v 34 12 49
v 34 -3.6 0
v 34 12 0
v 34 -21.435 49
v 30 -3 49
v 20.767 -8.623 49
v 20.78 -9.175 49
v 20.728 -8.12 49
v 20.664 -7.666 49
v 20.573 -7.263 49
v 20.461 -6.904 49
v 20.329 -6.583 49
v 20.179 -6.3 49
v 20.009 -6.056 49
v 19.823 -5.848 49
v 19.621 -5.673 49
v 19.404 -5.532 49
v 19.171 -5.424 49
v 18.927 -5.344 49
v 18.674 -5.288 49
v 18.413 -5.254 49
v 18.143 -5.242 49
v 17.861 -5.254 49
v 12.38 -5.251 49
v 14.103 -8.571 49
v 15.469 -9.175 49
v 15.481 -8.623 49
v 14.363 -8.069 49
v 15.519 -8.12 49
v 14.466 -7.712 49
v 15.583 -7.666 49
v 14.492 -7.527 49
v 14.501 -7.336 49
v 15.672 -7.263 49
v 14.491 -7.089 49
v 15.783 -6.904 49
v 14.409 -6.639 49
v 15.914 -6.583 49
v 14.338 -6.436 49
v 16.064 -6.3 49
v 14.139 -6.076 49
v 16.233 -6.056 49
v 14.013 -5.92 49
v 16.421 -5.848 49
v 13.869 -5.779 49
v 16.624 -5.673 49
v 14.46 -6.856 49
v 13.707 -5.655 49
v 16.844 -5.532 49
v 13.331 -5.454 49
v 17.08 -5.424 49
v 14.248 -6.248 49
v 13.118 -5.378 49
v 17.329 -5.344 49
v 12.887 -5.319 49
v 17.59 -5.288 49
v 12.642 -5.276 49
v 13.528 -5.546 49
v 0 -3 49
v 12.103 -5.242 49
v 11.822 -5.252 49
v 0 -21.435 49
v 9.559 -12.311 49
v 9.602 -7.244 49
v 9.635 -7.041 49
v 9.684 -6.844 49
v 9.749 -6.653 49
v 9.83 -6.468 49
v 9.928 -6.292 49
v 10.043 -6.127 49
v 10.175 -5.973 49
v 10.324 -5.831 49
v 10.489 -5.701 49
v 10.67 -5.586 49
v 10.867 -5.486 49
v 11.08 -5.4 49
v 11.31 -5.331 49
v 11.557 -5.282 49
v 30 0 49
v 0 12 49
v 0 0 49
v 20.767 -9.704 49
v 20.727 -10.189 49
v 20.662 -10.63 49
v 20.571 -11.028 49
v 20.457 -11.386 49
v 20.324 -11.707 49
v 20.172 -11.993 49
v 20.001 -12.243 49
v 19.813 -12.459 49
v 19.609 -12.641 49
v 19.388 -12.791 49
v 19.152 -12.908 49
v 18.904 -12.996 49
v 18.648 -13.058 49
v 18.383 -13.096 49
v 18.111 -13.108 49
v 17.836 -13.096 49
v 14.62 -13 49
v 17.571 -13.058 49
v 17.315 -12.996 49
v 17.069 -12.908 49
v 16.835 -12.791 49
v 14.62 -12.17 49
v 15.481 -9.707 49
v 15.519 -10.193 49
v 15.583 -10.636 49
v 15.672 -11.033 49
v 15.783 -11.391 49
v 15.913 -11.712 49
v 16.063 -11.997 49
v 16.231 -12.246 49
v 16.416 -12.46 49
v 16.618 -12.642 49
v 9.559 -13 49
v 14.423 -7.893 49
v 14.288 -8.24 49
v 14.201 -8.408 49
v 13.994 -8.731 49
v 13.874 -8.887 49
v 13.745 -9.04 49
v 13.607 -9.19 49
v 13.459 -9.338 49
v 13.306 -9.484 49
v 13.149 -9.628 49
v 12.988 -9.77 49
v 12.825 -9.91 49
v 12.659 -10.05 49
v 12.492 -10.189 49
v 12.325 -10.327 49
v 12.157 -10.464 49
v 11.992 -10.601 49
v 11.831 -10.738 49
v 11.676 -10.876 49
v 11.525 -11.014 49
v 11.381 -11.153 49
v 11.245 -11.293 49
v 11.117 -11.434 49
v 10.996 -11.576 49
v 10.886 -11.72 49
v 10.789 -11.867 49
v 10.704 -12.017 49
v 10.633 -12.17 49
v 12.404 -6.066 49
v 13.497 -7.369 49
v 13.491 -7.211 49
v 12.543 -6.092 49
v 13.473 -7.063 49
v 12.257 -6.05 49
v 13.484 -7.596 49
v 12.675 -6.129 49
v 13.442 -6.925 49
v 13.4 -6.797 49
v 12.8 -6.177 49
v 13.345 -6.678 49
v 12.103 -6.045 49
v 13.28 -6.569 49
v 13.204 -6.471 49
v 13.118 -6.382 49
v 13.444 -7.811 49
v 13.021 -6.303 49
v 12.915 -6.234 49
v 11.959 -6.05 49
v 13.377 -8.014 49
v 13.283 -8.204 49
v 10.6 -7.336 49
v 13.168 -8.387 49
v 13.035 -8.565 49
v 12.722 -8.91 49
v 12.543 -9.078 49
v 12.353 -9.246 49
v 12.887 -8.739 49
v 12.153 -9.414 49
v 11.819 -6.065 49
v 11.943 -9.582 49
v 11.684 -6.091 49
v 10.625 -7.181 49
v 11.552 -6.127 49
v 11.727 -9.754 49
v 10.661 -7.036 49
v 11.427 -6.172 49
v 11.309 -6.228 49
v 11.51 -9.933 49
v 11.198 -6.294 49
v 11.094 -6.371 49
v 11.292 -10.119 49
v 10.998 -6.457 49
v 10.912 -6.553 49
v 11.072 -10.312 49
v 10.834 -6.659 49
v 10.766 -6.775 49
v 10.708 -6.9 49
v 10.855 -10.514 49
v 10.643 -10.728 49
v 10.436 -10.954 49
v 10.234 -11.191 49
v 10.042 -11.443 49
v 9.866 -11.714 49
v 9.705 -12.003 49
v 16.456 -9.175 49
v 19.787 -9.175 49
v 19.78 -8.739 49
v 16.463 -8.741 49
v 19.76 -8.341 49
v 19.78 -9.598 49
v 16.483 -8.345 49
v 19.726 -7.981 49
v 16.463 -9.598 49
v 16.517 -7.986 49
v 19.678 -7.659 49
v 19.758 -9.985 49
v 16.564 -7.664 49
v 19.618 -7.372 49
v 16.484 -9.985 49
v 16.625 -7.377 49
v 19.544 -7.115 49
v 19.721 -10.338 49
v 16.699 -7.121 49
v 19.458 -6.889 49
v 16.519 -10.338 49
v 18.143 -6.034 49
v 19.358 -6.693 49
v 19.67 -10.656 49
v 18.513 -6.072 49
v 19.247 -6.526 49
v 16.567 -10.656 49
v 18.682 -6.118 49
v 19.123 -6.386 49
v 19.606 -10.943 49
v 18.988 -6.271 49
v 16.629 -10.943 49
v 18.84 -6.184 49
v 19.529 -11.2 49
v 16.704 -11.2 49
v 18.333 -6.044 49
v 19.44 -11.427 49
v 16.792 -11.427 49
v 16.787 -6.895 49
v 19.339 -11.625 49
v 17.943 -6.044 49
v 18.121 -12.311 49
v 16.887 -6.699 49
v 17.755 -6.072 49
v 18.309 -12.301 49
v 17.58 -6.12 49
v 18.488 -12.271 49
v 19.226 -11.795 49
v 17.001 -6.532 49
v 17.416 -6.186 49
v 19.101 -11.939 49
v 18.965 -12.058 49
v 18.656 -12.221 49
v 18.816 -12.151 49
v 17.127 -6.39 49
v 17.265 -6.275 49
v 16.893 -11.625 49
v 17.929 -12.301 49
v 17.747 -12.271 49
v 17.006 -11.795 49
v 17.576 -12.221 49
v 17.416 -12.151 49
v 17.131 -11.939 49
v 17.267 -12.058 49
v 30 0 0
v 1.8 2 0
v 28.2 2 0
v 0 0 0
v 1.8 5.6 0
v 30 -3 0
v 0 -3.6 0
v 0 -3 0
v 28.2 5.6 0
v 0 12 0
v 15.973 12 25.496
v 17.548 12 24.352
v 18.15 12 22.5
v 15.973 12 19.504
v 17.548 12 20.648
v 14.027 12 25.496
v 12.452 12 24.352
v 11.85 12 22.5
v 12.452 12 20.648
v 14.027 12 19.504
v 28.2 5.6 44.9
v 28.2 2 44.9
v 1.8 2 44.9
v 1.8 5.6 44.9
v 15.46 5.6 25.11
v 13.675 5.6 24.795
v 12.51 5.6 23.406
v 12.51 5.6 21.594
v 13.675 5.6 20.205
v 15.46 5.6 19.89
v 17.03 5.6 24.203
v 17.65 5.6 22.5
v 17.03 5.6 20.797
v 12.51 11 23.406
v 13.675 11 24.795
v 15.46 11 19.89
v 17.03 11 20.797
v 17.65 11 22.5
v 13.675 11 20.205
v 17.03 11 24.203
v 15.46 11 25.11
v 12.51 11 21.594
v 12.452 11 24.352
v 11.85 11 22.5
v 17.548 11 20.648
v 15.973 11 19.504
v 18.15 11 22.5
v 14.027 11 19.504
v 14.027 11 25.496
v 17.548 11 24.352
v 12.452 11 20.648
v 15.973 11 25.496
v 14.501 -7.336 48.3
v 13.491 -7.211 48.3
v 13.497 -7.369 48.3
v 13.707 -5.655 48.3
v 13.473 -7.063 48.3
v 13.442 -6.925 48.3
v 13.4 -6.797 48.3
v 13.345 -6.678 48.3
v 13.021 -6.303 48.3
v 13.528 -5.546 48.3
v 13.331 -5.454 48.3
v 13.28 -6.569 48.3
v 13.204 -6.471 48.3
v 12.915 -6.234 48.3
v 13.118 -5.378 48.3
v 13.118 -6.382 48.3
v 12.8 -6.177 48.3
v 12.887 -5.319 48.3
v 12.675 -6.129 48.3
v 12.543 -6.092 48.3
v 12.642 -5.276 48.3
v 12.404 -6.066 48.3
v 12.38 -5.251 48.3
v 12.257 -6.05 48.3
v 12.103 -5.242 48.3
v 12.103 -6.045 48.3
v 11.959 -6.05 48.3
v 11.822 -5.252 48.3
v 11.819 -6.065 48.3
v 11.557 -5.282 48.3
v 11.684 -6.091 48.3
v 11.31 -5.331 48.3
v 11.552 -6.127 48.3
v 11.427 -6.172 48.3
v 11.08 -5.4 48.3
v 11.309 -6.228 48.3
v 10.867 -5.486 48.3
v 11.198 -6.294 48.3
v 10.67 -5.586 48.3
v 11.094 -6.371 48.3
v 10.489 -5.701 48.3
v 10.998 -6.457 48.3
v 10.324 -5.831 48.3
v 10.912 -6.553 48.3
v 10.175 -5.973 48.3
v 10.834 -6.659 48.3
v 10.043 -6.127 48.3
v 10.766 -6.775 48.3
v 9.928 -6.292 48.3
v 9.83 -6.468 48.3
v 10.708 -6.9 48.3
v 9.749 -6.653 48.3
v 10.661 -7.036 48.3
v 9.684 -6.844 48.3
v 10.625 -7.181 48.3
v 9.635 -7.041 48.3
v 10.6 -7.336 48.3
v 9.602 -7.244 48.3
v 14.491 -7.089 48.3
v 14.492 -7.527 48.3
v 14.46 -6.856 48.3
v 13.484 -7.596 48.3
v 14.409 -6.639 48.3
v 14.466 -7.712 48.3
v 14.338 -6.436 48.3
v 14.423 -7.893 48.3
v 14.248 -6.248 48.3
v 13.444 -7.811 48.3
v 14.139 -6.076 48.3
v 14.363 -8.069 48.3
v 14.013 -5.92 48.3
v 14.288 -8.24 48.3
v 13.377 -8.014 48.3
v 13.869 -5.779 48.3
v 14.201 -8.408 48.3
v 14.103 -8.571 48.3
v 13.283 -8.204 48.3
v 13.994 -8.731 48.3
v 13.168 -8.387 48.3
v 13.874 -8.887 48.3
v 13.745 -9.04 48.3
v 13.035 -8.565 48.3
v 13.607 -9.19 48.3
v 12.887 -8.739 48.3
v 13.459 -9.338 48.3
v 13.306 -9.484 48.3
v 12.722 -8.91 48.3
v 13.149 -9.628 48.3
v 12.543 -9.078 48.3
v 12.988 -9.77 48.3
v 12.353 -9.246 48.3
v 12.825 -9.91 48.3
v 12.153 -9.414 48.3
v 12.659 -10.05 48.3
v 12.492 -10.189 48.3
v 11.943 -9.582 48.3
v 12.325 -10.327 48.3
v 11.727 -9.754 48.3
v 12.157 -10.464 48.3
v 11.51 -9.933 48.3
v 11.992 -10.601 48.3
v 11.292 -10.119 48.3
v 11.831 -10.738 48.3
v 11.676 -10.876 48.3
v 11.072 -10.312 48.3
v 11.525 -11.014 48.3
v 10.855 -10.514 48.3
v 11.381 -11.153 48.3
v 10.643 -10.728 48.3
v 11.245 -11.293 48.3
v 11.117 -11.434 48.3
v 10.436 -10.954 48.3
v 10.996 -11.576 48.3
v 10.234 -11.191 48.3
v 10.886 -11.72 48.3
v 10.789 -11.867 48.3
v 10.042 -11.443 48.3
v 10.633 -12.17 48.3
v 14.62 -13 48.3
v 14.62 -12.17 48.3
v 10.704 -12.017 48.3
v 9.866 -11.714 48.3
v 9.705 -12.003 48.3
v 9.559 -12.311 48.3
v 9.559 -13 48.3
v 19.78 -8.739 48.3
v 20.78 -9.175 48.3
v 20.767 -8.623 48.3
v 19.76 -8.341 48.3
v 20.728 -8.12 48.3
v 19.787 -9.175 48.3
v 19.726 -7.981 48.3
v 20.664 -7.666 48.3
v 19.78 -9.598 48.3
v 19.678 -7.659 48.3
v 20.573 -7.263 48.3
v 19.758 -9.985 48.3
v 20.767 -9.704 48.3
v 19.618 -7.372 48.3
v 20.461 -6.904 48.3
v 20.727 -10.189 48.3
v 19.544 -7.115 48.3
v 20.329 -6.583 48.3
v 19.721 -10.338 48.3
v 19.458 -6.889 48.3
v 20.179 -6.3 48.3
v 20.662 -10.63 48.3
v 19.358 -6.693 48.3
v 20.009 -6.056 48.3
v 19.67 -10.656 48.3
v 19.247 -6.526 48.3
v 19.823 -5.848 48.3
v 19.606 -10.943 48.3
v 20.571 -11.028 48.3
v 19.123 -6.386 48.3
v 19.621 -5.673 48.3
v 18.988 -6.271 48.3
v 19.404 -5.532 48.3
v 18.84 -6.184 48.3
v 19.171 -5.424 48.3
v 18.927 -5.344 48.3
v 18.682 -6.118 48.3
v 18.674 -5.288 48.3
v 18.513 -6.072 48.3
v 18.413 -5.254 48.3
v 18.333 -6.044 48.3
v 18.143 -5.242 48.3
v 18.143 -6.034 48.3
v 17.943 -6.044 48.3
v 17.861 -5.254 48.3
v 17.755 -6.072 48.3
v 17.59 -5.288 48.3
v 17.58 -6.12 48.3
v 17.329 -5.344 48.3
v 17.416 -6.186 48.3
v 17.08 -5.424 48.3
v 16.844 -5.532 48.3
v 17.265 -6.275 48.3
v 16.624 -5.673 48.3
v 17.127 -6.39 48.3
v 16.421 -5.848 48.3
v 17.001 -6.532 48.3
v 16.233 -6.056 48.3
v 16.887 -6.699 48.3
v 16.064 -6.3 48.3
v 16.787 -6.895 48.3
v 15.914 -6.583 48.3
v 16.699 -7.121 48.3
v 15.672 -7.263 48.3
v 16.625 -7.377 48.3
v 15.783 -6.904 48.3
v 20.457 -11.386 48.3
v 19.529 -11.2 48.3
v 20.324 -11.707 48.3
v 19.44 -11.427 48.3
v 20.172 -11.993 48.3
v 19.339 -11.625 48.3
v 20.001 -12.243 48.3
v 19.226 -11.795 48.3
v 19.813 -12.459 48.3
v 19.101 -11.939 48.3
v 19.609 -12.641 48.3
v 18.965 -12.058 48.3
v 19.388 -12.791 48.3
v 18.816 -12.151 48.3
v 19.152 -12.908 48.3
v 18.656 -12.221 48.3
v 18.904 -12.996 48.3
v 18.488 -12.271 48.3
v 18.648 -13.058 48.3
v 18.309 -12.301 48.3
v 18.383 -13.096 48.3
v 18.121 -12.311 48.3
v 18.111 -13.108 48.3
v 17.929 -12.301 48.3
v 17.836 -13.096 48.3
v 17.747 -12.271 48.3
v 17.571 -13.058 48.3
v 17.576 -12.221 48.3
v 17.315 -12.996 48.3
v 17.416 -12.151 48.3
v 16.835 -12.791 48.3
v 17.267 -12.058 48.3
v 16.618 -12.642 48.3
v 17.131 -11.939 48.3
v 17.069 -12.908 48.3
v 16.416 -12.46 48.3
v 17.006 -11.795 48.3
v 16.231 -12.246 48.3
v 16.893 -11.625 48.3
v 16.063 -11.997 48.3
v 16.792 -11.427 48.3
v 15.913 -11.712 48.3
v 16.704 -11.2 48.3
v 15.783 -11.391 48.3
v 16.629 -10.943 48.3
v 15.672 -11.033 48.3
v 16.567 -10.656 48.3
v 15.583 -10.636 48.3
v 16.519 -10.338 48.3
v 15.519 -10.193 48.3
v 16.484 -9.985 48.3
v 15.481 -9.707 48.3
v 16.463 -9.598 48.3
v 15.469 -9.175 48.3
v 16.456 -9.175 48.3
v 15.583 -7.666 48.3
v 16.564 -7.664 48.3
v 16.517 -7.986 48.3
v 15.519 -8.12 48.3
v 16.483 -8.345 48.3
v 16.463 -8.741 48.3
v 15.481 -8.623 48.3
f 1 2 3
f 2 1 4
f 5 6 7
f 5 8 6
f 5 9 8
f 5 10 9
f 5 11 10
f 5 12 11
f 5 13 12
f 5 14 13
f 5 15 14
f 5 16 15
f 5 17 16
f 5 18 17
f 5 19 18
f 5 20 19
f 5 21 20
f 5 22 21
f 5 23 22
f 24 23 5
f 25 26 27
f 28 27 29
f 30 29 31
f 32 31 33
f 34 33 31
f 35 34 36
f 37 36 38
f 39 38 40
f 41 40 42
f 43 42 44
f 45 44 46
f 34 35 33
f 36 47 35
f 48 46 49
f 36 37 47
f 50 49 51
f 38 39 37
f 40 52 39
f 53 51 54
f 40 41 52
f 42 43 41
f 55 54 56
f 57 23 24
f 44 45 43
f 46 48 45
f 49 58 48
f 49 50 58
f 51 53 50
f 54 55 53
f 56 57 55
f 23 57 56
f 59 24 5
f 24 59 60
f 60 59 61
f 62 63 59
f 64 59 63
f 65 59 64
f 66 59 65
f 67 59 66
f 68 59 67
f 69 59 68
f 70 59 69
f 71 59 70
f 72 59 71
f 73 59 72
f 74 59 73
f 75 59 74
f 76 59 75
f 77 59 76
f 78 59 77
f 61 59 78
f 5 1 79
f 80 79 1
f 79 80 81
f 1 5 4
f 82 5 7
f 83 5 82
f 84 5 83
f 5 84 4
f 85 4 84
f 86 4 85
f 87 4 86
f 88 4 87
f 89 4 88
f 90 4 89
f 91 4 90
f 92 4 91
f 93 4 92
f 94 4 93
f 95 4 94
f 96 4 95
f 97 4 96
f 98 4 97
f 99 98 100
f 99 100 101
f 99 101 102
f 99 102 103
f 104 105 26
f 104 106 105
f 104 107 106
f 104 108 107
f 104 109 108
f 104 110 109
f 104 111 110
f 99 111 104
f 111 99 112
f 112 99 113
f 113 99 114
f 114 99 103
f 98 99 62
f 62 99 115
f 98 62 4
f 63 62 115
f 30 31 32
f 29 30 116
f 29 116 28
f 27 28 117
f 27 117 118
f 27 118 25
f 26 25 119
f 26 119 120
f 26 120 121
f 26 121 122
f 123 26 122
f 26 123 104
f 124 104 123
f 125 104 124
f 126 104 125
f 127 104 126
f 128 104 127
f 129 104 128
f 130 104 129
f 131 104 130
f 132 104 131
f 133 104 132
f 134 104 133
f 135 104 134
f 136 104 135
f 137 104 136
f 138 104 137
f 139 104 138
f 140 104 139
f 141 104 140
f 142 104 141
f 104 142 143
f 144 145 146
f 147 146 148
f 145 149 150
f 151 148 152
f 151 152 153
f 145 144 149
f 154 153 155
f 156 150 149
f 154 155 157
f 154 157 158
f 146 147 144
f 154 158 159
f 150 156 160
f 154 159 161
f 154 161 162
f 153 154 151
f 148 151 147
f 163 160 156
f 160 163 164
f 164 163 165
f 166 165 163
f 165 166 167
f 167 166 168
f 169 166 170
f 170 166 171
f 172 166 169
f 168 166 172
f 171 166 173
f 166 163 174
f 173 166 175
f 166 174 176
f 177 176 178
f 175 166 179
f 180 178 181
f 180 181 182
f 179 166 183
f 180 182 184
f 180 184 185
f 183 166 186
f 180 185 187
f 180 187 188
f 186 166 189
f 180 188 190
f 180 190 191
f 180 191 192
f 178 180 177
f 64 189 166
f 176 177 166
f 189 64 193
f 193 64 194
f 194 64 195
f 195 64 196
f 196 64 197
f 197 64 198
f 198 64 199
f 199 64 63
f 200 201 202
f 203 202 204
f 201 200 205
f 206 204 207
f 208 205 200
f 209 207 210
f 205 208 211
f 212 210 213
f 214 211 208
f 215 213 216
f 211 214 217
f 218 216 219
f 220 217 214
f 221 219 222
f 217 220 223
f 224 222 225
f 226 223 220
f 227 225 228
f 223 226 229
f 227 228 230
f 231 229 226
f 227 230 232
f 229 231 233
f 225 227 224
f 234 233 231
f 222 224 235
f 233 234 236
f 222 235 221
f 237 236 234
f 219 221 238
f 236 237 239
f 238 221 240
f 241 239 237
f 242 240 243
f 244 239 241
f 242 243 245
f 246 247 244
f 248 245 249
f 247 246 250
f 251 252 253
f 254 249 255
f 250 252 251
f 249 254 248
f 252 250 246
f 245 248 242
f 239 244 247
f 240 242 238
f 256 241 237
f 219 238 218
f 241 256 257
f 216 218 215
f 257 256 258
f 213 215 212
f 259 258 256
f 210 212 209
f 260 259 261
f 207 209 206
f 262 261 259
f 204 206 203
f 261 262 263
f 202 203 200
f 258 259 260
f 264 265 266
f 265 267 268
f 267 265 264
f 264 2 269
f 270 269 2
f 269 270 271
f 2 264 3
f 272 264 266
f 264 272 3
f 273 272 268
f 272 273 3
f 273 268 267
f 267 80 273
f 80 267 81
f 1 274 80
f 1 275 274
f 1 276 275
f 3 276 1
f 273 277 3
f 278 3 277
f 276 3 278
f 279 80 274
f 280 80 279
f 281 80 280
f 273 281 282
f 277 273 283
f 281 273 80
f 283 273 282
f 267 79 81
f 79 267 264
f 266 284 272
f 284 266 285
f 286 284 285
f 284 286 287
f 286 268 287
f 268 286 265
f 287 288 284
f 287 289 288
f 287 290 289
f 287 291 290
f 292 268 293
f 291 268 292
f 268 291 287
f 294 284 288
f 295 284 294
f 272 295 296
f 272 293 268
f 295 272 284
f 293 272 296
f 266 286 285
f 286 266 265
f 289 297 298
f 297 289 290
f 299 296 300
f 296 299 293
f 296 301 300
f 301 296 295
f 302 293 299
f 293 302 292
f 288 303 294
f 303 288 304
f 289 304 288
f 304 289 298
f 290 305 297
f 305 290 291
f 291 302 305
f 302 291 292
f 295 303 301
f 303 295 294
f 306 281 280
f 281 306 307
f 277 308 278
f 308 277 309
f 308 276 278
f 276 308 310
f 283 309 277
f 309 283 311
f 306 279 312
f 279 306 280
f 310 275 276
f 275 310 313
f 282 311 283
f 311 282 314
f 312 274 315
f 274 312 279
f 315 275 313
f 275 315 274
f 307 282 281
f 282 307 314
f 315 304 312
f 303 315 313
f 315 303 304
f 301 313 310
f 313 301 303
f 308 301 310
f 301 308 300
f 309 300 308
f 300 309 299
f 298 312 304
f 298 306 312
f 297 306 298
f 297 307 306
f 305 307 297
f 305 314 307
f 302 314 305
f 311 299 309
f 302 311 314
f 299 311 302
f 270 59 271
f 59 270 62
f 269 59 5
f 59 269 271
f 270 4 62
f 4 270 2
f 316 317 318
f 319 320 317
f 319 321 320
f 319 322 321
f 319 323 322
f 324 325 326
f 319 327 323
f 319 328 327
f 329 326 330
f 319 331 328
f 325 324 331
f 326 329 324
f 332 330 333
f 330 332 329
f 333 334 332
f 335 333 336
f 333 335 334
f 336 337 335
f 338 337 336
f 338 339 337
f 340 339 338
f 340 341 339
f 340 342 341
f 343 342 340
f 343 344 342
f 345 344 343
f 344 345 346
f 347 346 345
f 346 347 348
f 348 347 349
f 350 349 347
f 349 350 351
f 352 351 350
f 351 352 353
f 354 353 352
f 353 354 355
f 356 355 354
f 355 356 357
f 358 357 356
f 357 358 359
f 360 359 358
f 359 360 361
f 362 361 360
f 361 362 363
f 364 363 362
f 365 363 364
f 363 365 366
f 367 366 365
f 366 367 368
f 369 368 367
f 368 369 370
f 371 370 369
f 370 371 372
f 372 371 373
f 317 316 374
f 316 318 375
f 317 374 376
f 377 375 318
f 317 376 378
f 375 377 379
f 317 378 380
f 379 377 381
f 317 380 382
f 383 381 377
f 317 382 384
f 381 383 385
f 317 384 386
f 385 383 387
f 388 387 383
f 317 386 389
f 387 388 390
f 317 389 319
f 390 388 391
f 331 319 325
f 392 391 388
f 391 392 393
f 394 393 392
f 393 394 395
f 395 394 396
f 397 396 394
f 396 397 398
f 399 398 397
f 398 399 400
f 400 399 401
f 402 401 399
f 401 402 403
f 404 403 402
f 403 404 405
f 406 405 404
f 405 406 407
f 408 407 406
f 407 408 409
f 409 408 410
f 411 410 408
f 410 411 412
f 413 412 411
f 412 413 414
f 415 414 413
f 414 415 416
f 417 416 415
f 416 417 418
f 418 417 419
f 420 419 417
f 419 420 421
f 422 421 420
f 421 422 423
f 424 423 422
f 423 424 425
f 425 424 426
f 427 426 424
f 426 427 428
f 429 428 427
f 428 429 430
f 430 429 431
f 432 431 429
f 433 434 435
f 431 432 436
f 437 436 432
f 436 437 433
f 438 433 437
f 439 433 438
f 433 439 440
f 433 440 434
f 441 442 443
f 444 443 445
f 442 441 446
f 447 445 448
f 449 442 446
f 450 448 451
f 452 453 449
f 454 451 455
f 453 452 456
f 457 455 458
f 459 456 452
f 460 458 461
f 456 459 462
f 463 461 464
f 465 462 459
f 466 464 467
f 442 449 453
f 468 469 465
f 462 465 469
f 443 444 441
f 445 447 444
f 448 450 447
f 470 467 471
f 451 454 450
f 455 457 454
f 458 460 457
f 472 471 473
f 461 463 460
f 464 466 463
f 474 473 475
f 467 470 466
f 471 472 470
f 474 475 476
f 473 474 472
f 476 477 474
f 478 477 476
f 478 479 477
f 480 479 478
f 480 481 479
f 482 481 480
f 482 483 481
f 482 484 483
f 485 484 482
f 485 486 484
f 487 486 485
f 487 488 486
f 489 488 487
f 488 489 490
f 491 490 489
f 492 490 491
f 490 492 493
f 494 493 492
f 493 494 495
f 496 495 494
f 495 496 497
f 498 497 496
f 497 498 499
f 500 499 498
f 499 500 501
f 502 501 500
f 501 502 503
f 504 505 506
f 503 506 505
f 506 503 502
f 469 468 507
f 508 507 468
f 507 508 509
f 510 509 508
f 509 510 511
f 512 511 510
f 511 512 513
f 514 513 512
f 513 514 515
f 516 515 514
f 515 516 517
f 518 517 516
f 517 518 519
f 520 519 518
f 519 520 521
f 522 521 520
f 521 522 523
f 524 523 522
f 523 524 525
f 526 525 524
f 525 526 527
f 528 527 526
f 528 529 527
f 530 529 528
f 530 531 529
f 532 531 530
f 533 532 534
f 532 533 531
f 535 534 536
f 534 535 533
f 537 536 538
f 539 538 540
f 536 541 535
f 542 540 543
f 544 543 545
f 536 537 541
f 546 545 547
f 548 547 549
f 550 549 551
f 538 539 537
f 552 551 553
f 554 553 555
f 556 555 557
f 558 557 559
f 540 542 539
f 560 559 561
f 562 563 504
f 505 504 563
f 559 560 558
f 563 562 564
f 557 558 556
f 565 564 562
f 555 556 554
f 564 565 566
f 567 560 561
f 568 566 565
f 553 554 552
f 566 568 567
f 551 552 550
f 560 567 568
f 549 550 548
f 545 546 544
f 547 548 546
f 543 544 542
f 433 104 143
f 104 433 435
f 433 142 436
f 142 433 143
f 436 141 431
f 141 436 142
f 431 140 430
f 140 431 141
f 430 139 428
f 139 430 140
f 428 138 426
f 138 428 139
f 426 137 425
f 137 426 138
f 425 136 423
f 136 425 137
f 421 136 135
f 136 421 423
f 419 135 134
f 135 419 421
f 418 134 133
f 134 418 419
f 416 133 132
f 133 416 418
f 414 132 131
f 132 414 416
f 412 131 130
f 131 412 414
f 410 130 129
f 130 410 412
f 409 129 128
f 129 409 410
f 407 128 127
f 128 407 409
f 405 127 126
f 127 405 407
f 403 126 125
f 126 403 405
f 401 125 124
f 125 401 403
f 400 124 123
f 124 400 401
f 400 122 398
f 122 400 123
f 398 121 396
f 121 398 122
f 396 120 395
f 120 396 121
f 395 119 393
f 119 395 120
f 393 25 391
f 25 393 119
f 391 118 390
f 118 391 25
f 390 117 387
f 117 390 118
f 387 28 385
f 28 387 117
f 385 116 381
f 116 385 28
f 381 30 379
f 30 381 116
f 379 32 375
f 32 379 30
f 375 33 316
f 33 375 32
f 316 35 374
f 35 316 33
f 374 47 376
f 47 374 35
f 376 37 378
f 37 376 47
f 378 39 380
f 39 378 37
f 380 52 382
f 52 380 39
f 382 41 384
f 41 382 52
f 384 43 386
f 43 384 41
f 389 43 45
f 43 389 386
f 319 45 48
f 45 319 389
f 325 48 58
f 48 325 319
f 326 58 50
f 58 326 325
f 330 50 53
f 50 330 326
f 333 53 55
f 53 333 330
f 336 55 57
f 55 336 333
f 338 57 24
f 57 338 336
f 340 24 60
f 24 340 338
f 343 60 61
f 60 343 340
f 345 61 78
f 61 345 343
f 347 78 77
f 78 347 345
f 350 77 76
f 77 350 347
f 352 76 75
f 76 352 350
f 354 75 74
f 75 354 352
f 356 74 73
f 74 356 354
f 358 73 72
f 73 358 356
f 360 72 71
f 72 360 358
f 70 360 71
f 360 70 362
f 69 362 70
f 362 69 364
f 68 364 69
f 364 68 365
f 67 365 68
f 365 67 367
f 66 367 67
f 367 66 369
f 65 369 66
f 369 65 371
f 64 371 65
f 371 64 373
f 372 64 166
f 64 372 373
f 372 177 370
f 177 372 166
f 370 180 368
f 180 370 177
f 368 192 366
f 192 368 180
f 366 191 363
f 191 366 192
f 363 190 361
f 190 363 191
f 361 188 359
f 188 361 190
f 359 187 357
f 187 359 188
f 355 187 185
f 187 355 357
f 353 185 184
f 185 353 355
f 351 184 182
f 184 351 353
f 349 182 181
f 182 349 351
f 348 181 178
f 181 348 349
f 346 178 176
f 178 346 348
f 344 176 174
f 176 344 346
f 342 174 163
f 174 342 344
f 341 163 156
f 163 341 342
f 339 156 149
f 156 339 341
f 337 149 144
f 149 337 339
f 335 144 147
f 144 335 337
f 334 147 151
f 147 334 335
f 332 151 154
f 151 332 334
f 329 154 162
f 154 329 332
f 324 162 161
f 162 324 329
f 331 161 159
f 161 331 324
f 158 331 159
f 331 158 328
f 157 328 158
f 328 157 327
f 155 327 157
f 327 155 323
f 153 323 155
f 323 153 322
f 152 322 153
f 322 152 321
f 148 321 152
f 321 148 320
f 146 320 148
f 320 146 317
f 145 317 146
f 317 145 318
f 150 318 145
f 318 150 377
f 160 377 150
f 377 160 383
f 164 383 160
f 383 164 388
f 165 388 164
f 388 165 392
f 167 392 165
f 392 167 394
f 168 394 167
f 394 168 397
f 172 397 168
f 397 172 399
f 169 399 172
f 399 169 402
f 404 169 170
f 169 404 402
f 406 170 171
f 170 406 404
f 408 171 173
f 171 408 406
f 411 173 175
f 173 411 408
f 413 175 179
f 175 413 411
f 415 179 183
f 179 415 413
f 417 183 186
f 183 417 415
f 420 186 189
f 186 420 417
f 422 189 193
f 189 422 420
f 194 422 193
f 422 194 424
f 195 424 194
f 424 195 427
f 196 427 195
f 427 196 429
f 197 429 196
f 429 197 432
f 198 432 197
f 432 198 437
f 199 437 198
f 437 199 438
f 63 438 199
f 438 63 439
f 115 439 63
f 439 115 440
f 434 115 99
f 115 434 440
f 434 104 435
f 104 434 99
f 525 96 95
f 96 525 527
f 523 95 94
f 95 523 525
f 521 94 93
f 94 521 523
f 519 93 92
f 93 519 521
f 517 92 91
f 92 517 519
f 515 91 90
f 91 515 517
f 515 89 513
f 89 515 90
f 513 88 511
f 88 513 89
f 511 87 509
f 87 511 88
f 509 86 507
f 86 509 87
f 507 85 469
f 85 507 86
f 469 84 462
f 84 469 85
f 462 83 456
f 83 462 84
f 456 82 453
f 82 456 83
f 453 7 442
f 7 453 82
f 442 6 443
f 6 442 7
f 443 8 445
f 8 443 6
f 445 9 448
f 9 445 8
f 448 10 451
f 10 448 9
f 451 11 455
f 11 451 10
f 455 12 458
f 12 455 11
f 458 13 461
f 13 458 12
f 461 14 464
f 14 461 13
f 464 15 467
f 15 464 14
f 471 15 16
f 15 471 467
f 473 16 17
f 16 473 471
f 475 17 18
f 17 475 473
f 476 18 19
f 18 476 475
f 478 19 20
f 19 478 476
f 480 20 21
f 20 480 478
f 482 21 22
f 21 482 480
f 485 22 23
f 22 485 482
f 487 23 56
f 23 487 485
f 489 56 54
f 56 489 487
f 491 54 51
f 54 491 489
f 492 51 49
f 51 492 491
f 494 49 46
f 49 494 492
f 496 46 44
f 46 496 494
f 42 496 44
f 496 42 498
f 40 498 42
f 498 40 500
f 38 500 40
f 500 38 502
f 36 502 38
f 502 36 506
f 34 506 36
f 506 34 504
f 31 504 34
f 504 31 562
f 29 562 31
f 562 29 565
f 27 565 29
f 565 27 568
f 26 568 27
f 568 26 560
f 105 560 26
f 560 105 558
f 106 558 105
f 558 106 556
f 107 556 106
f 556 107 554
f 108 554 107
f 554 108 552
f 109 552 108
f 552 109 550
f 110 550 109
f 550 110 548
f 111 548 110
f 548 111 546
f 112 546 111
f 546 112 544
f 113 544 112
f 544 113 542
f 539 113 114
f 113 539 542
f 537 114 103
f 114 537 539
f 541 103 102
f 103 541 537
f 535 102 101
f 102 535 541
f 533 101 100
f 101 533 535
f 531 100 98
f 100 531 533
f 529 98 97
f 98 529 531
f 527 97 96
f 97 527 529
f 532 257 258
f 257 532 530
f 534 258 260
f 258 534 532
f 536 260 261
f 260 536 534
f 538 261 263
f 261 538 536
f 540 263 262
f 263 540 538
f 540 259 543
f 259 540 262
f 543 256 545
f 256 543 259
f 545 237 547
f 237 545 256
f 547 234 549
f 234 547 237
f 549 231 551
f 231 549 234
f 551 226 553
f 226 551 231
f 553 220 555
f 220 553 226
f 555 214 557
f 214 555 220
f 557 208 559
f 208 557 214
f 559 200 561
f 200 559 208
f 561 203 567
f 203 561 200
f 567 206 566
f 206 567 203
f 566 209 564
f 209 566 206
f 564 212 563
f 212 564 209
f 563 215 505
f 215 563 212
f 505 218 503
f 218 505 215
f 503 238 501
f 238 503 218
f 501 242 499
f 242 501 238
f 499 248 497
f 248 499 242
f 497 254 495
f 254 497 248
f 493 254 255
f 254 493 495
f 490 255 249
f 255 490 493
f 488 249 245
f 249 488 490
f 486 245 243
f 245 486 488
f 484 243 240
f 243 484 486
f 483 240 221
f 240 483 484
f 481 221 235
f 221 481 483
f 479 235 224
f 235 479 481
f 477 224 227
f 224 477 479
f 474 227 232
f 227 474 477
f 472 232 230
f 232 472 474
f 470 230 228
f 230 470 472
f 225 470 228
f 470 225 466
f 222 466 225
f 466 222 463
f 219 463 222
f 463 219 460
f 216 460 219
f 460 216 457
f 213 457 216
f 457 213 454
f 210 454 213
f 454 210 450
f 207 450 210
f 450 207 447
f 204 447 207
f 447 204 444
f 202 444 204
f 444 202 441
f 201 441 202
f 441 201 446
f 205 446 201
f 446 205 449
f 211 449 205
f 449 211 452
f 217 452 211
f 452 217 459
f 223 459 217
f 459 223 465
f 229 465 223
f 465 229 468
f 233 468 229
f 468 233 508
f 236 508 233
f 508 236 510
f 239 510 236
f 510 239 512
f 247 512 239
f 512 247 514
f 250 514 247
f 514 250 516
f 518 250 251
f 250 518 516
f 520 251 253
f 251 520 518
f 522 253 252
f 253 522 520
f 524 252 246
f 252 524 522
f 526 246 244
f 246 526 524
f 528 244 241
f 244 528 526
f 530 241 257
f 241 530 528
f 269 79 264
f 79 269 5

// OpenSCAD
/*NOTES:
	- Set screw: The hole needs to be tight enough to force a screw in andcreate its own threads.  A 1/2in bolt is ~6.2mm at the outter end of the threads and and ~5.2mm at the inner end.  PreThread is the larger of the two and ScrewHole is the inner size.
*/
angle = 20;

// Base is the main block that attaches to the sander.
baseWidth = 34;
baseHeight = 49;
baseThick = 12;
setScrewHole = 5.3;
setPreThread = 1; //depth for pre-threading the set screw
// Anchor is the hole in the block that goes over the snaders backer plate.
anchorThick = 3.6;
anchorWidth = 26.4;
anchorHeight = baseHeight-4;
anchorOffset = 2;   // distance from back side of belt
// Space between the base and the wedge
beltSpace = 3;
beltWallThick = 4;
// Wedge for blade reference
wedgeHeight = baseHeight;
wedgeBase = .6;

textSize = 8;
textDepth = .8;         // .5mm is pretty good...



// Calculations
wedgeThick = round(baseHeight*tan(angle));

echo(wedgeThick);

// Make the base
difference(){
    cube([baseWidth, baseThick, baseHeight]);
	// Remove the anchor hole
    translate([(baseWidth-anchorWidth-beltWallThick)/2, anchorOffset, -.1])
        cube([anchorWidth, anchorThick, anchorHeight]);
	// Remove the set screw hole
	//translate([0,anchorThick+beltSpace,0])rotate([270,0,0])
	translate([(baseWidth-beltWallThick)/2,anchorOffset+anchorThick,anchorHeight/2])rotate([270,0,0])
		#cylinder(d=setScrewHole, h=baseThick-anchorThick-anchorOffset);
	translate([(baseWidth-beltWallThick)/2,baseThick-1,anchorHeight/2])rotate([270,0,0])
		#cylinder(d=setScrewHole+1, h=1);
}

// Make the wedge to base connector
translate([baseWidth-beltWallThick,-beltSpace,baseHeight-wedgeHeight])
    cube([beltWallThick, beltSpace, wedgeHeight]);

// Make the wedge
difference(){
    translate([0,-(beltSpace+wedgeThick+wedgeBase),baseHeight-wedgeHeight])
        cube([baseWidth, wedgeThick+wedgeBase, wedgeHeight]);
    translate([baseWidth,-beltSpace-wedgeBase,baseHeight-wedgeHeight])rotate([-angle,0,180])
        cube([baseWidth, wedgeThick, wedgeHeight*2]);
    translate([baseWidth/2-textSize,-beltSpace-textSize-2,baseHeight+.1-textDepth]) 
        linear_extrude(textDepth)
            #text(text = str(angle), size = textSize);
}


//baseHeight-wedgeHeight+.1-textDepth
